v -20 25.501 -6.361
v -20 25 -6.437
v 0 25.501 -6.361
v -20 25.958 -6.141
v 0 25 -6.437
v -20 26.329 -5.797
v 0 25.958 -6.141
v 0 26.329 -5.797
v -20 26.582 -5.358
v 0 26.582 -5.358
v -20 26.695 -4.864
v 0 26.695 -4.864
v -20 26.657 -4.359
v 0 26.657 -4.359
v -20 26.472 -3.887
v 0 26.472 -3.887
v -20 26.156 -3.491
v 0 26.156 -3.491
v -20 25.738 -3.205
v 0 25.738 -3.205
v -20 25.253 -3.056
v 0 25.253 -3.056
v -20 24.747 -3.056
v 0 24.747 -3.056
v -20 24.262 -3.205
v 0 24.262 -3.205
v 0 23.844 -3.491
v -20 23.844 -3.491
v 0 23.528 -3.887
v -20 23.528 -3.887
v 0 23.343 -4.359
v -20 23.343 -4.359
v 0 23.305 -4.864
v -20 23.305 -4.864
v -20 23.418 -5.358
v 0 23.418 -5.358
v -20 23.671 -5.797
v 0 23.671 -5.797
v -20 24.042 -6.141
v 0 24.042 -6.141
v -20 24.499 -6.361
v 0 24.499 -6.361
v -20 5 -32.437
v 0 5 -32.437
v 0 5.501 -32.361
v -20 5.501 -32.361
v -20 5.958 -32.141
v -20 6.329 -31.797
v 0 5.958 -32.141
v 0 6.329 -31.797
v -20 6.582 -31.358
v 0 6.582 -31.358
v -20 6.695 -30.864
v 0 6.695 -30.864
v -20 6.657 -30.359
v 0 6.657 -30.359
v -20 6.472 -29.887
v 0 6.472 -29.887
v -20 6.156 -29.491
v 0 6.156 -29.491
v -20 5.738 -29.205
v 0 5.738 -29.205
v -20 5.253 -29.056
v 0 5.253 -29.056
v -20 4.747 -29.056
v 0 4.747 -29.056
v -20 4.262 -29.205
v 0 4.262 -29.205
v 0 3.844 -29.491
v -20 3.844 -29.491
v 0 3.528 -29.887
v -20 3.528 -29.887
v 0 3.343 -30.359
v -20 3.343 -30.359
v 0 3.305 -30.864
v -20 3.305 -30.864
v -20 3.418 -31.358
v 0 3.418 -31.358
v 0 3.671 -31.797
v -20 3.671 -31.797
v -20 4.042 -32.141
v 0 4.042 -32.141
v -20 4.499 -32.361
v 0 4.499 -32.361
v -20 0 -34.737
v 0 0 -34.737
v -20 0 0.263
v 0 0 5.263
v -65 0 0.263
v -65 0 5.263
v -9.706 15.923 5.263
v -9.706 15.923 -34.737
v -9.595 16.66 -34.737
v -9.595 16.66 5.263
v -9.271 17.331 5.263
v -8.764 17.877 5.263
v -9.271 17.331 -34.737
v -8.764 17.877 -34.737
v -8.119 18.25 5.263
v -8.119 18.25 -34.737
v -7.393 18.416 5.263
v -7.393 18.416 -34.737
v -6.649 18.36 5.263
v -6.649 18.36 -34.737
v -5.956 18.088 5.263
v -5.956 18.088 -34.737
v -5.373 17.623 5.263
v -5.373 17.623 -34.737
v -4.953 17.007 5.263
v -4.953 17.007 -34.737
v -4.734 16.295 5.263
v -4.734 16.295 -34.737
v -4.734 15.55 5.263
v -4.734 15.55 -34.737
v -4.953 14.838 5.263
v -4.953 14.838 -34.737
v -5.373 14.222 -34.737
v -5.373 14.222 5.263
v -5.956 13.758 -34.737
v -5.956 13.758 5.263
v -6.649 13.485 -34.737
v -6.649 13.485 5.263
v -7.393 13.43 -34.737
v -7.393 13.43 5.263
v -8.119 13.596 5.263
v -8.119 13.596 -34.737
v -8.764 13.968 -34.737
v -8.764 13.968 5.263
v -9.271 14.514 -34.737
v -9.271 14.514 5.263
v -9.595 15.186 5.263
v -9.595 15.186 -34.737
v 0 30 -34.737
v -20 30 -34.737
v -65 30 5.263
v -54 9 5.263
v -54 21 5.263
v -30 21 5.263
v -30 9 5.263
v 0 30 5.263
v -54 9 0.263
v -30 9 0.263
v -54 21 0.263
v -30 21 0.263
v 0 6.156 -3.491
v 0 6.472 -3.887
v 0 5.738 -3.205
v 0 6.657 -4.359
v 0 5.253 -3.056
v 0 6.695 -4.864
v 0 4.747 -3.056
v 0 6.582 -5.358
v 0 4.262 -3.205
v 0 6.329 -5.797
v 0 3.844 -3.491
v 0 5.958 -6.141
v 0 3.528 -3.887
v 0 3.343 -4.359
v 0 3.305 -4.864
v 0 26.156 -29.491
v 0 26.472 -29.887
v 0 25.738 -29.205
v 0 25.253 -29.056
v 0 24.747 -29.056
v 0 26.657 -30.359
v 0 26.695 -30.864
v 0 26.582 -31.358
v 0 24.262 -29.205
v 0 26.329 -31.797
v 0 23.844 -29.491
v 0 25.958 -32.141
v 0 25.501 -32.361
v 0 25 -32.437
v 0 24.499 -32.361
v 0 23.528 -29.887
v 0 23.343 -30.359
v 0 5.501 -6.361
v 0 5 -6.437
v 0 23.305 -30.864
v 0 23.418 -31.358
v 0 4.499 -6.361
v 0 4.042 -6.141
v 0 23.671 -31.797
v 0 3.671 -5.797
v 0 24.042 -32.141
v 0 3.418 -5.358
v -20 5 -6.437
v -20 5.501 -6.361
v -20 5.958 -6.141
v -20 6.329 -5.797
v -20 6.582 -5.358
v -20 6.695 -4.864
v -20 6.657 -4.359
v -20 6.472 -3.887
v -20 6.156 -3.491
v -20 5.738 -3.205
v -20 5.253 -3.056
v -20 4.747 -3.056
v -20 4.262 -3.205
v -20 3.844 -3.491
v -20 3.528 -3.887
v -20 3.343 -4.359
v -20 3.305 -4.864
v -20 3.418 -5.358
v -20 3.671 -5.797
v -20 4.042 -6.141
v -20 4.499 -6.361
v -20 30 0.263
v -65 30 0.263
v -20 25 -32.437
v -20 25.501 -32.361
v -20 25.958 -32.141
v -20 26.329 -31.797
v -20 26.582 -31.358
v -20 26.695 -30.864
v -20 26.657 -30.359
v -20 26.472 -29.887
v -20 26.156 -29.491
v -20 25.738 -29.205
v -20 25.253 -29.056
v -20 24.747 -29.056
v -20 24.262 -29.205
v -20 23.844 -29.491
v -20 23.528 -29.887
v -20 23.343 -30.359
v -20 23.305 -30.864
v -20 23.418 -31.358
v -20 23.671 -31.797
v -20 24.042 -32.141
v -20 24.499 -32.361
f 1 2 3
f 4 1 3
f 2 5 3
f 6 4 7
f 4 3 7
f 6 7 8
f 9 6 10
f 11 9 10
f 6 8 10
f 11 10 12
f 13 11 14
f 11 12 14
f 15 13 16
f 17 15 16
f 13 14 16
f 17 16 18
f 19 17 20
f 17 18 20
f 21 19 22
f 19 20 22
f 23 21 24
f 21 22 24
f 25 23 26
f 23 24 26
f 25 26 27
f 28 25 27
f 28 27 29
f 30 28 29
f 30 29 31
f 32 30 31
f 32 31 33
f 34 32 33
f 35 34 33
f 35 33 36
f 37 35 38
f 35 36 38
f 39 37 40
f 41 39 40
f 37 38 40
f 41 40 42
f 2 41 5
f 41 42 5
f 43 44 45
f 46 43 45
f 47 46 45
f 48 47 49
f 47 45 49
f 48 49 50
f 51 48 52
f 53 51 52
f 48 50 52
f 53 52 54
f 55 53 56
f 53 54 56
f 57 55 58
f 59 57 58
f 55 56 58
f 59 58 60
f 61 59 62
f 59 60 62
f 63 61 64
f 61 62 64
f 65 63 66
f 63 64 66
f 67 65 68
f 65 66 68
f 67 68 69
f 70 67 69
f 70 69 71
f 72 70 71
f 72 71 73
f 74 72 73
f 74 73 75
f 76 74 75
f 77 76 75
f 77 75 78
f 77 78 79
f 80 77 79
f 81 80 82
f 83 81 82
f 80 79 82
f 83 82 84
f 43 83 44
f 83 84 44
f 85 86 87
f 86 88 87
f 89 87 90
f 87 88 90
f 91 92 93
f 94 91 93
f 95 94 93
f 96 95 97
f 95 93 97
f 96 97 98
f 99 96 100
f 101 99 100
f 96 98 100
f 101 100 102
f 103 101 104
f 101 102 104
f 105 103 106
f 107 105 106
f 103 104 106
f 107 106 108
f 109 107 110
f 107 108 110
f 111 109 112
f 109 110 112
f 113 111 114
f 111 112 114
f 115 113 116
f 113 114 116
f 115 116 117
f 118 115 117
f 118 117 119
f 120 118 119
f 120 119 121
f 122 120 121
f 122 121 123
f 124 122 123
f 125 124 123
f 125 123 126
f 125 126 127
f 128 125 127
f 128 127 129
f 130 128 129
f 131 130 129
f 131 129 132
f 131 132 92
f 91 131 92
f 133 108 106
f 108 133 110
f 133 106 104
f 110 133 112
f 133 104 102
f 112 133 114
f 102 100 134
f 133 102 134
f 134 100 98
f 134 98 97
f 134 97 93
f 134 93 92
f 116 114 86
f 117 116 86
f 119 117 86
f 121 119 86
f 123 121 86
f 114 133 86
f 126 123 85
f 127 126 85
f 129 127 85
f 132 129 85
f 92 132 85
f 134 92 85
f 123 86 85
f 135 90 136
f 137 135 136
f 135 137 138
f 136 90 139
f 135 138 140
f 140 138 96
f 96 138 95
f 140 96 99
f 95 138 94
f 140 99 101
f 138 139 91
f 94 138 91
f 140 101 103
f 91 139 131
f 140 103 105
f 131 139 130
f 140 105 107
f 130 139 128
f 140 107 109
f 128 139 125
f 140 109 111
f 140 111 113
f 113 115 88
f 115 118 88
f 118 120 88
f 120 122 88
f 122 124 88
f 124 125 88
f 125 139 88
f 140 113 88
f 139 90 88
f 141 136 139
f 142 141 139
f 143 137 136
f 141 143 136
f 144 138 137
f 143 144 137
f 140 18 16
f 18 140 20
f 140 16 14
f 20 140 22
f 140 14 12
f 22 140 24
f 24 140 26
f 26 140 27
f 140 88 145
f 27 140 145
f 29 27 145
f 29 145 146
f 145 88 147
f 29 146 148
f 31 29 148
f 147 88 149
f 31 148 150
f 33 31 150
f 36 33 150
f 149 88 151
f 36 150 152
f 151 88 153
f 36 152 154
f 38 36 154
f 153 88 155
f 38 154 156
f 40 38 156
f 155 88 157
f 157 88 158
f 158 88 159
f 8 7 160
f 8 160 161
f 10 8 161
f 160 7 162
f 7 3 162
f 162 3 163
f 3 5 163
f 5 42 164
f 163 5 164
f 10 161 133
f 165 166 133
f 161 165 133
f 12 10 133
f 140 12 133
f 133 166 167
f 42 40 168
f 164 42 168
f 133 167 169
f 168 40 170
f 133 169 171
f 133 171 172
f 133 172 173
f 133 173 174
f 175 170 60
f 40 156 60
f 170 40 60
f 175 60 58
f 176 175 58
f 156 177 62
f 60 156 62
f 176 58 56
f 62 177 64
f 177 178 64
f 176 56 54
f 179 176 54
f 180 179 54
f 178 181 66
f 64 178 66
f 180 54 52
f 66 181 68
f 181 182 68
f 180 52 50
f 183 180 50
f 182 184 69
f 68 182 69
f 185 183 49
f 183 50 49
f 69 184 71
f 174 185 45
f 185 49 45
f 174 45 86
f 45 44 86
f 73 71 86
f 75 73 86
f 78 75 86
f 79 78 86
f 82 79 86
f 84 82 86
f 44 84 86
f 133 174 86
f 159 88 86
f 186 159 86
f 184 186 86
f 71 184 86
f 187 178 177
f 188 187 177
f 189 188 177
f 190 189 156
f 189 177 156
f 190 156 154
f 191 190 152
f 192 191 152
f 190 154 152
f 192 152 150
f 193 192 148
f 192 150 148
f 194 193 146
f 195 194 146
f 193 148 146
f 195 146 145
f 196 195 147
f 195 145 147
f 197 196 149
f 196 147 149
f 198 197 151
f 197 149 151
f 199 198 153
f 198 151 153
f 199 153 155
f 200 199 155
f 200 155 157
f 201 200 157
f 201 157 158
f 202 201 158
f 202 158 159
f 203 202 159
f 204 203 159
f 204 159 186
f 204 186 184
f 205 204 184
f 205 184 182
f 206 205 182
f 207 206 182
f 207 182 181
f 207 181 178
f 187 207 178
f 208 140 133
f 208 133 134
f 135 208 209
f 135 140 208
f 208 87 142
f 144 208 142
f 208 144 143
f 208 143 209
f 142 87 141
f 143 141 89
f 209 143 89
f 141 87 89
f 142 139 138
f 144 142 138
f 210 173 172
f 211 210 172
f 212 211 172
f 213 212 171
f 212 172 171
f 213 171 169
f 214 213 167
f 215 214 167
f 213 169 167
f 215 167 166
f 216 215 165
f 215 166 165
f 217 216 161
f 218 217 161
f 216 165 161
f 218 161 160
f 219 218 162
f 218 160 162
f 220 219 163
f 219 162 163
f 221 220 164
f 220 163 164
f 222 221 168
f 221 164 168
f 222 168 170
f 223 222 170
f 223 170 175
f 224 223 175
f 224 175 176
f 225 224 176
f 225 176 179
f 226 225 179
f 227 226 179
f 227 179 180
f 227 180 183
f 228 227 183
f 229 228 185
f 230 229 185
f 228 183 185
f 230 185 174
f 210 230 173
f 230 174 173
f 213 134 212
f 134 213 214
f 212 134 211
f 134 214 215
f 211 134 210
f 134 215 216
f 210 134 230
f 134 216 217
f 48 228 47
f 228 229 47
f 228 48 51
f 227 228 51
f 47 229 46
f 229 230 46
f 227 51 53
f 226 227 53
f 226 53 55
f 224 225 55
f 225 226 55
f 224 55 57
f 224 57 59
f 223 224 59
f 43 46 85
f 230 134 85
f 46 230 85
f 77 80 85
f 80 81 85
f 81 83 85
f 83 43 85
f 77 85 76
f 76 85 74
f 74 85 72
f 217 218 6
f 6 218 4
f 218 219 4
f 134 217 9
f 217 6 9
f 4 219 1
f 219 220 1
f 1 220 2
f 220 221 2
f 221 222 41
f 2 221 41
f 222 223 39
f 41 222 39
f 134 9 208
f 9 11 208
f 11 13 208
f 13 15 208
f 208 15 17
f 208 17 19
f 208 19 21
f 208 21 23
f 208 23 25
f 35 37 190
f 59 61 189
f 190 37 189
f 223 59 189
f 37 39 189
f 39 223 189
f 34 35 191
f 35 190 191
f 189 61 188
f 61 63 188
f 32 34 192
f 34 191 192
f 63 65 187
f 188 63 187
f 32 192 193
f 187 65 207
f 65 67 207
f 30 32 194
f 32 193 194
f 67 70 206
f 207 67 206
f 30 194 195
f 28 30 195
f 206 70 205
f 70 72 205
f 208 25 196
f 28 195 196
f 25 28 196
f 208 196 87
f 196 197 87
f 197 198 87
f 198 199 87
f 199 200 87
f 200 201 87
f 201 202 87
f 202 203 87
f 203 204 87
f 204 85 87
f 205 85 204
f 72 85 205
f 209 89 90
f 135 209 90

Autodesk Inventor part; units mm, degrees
ref_plane "YZ Plane" through (0, 0, 0) normal (1, 0, 0) x (0, 1, 0)
ref_plane "XZ Plane" through (0, 0, 0) normal (0, 1, 0) x (-1, 0, 0)
ref_plane "XY Plane" through (0, 0, 0) normal (0, 0, 1) x (1, 0, 0)
sketch "Skizze1" plane through (0, 0, 0) normal (0, 1, 0) x (-1, 0, 0)
  line L0 (65, 5.2632) -> (0, 5.2632)
  line L1 (0, 5.2632) -> (0, -34.7368)
  line L2 (0, -34.7368) -> (20, -34.7368)
  line L3 (20, -34.7368) -> (20, 0.2632)
  line L4 (20, 0.2632) -> (65, 0.2632)
  line L5 (65, 0.2632) -> (65, 5.2632)
  point P0 (0, 0)
  dimension "d0" = 5
  dimension "d1" = 20
  dimension "d2" = 40
  dimension "d5" = 65
extrude "Extrusion1" add sketch "Skizze1" along normal blind 30
sketch "Skizze2" plane through (-65, 0, 5.2632) normal (0, 0, 1) x (1, 0, 0)
  line L0 (11, 9) -> (35, 9)
  line L1 (35, 9) -> (35, 21)
  line L2 (35, 21) -> (11, 21)
  line L3 (11, 21) -> (11, 9)
  line L4 (65, 0) -> (65, 30) projected
  line L5 (0, 30) -> (65, 30) projected
  dimension "d6" = 30
  dimension "d7" = 24
  dimension "d8" = 12
  dimension "d9" = 9
extrude "Extrusion2" cut sketch "Skizze2" against normal blind 5
sketch "Skizze3" plane through (0, 0, 5.2632) normal (1, 0, 0) x (0, 0, -1)
  circle A0 centre (10, 5) radius 1.7
  circle A1 centre (36, 5) radius 1.7
  circle A2 centre (10, 25) radius 1.7
  circle A3 centre (36, 25) radius 1.7
  line L0 (0, 0) -> (0, 30) projected
  line L1 (0, 30) -> (40, 30) projected
  line L2 (40, 0) -> (40, 30) projected
  point P0 (5.2632, 0)
  dimension "d12" = 3.4
  dimension "d13" = 3.4
  dimension "d14" = 3.4
  dimension "d15" = 3.4
  dimension "d16" = 10
  dimension "d17" = 20
  dimension "d18" = 5
  dimension "d19" = 10
  dimension "d20" = 4
  dimension "d21" = 20
  dimension "d22" = 4
  dimension "d23" = 5
extrude "Extrusion3" cut sketch "Skizze3" against normal blind 20
sketch "Skizze4" plane through (0, 0, 5.2632) normal (1, 0, 0) x (0, 0, -1)
  point P0 (5.2632, 0)
sketch "Skizze5" plane through (0, 0, -34.7368) normal (0, 0, -1) x (-1, 0, 0)
  arc A0 (0.0007, -11.0976) -> (-0.0008, 42.9427) centre (7.2057, 15.9227) ccw projected
  circle A1 centre (7.2057, 15.9227) radius 2.5
  point P0 (0, 0)
  dimension "d26" = 5
extrude "Extrusion4" cut sketch "Skizze5" against normal through all
properties part number "L-Halterung Servo"
